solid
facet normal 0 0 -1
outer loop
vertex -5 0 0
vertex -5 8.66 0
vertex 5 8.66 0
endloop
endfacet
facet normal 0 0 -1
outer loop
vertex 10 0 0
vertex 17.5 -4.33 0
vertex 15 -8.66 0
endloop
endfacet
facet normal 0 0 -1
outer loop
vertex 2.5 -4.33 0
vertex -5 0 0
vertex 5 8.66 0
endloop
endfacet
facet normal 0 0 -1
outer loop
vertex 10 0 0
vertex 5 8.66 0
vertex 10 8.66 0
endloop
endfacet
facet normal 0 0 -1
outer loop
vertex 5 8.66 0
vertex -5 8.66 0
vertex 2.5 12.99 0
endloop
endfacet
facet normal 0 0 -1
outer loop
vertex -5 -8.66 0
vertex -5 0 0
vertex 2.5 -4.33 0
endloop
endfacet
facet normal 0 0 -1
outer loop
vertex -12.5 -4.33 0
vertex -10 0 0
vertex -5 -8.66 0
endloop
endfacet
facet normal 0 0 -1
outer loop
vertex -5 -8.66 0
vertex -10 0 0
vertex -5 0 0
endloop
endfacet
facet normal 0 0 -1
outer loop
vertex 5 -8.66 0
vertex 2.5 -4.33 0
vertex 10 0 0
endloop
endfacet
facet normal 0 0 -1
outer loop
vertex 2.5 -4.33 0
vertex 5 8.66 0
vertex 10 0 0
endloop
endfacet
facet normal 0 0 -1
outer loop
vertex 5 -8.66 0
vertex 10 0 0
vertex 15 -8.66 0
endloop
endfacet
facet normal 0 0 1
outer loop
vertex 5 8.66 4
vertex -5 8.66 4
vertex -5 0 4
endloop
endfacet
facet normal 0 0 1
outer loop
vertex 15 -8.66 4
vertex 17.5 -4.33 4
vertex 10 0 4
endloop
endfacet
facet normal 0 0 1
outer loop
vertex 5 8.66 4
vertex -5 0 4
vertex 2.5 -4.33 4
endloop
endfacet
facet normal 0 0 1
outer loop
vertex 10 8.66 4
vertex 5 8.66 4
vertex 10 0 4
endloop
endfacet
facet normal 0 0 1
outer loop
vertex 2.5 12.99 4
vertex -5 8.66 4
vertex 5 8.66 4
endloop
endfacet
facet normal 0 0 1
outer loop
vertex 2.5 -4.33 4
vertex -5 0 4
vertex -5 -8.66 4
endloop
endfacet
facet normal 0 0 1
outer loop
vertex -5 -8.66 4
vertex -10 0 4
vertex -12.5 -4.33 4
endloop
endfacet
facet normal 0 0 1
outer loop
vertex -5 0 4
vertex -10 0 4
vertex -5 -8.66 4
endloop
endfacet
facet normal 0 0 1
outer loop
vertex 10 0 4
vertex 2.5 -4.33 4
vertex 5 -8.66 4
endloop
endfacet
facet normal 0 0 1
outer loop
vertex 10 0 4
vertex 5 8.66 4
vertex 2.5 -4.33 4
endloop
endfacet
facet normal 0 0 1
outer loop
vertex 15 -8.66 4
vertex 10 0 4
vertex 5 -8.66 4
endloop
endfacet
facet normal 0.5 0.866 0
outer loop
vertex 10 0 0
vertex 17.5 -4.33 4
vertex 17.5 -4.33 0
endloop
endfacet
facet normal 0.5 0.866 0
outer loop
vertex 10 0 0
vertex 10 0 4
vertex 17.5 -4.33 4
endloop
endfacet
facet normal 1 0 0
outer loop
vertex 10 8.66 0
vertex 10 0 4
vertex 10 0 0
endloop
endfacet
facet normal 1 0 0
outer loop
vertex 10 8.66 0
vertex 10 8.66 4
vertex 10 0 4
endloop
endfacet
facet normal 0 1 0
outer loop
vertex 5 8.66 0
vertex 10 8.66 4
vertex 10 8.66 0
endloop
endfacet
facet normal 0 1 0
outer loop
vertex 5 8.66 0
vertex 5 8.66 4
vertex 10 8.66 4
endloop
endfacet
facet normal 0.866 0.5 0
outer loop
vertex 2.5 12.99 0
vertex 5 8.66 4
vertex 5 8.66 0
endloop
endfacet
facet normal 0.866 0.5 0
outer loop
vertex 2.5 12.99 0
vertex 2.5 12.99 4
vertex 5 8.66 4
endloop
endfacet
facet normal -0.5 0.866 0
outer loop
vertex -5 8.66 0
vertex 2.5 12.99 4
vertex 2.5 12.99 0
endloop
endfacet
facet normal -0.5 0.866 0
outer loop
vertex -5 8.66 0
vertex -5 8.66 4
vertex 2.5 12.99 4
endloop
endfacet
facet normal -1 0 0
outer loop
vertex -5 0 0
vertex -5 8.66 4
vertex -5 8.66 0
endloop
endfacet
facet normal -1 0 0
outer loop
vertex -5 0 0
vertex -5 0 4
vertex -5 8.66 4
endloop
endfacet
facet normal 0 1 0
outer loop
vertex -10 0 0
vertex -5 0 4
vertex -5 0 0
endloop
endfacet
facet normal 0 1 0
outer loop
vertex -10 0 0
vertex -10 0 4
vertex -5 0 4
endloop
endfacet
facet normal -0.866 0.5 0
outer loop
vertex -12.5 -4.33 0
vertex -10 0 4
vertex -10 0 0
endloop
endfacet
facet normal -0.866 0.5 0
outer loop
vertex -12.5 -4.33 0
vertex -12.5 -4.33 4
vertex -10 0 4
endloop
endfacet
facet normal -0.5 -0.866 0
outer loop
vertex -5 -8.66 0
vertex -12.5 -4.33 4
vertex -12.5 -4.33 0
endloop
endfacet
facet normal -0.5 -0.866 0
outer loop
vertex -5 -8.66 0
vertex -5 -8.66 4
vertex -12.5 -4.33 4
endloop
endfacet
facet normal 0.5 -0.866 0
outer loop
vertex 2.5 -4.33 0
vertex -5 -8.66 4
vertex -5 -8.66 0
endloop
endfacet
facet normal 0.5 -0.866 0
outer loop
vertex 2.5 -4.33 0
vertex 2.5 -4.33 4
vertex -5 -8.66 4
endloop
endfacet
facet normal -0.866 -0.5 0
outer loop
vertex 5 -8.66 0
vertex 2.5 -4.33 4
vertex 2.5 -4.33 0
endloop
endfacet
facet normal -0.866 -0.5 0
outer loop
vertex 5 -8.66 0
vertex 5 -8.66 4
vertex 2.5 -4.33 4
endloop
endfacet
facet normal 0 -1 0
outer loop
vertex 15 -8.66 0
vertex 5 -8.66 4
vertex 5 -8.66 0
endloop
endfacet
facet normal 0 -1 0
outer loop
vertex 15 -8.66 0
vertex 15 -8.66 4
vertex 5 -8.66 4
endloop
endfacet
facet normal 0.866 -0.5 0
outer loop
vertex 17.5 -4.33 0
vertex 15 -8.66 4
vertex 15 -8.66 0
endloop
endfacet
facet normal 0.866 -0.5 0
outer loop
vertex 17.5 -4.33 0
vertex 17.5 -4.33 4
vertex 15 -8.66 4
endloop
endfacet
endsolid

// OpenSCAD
r = [1,0];
u = [cos(60),sin(60)];
d = [cos(60),-sin(60)];

points = [
    [0,0],
    1/2 * r,
    u,
    2*u + 1/2*d,
    r + u,
    u + 3/2*r,
    2*r,
    3*r - 1/2*u,
    2*r + d,
    r + d,
    r + 1/2 * d,
    d,
    -1/2 * u
 ];

 module tile() {
     linear_extrude(4) {
         scale(10) translate(-r) polygon(points);
     }
 }

 tile();
//echo(points);
